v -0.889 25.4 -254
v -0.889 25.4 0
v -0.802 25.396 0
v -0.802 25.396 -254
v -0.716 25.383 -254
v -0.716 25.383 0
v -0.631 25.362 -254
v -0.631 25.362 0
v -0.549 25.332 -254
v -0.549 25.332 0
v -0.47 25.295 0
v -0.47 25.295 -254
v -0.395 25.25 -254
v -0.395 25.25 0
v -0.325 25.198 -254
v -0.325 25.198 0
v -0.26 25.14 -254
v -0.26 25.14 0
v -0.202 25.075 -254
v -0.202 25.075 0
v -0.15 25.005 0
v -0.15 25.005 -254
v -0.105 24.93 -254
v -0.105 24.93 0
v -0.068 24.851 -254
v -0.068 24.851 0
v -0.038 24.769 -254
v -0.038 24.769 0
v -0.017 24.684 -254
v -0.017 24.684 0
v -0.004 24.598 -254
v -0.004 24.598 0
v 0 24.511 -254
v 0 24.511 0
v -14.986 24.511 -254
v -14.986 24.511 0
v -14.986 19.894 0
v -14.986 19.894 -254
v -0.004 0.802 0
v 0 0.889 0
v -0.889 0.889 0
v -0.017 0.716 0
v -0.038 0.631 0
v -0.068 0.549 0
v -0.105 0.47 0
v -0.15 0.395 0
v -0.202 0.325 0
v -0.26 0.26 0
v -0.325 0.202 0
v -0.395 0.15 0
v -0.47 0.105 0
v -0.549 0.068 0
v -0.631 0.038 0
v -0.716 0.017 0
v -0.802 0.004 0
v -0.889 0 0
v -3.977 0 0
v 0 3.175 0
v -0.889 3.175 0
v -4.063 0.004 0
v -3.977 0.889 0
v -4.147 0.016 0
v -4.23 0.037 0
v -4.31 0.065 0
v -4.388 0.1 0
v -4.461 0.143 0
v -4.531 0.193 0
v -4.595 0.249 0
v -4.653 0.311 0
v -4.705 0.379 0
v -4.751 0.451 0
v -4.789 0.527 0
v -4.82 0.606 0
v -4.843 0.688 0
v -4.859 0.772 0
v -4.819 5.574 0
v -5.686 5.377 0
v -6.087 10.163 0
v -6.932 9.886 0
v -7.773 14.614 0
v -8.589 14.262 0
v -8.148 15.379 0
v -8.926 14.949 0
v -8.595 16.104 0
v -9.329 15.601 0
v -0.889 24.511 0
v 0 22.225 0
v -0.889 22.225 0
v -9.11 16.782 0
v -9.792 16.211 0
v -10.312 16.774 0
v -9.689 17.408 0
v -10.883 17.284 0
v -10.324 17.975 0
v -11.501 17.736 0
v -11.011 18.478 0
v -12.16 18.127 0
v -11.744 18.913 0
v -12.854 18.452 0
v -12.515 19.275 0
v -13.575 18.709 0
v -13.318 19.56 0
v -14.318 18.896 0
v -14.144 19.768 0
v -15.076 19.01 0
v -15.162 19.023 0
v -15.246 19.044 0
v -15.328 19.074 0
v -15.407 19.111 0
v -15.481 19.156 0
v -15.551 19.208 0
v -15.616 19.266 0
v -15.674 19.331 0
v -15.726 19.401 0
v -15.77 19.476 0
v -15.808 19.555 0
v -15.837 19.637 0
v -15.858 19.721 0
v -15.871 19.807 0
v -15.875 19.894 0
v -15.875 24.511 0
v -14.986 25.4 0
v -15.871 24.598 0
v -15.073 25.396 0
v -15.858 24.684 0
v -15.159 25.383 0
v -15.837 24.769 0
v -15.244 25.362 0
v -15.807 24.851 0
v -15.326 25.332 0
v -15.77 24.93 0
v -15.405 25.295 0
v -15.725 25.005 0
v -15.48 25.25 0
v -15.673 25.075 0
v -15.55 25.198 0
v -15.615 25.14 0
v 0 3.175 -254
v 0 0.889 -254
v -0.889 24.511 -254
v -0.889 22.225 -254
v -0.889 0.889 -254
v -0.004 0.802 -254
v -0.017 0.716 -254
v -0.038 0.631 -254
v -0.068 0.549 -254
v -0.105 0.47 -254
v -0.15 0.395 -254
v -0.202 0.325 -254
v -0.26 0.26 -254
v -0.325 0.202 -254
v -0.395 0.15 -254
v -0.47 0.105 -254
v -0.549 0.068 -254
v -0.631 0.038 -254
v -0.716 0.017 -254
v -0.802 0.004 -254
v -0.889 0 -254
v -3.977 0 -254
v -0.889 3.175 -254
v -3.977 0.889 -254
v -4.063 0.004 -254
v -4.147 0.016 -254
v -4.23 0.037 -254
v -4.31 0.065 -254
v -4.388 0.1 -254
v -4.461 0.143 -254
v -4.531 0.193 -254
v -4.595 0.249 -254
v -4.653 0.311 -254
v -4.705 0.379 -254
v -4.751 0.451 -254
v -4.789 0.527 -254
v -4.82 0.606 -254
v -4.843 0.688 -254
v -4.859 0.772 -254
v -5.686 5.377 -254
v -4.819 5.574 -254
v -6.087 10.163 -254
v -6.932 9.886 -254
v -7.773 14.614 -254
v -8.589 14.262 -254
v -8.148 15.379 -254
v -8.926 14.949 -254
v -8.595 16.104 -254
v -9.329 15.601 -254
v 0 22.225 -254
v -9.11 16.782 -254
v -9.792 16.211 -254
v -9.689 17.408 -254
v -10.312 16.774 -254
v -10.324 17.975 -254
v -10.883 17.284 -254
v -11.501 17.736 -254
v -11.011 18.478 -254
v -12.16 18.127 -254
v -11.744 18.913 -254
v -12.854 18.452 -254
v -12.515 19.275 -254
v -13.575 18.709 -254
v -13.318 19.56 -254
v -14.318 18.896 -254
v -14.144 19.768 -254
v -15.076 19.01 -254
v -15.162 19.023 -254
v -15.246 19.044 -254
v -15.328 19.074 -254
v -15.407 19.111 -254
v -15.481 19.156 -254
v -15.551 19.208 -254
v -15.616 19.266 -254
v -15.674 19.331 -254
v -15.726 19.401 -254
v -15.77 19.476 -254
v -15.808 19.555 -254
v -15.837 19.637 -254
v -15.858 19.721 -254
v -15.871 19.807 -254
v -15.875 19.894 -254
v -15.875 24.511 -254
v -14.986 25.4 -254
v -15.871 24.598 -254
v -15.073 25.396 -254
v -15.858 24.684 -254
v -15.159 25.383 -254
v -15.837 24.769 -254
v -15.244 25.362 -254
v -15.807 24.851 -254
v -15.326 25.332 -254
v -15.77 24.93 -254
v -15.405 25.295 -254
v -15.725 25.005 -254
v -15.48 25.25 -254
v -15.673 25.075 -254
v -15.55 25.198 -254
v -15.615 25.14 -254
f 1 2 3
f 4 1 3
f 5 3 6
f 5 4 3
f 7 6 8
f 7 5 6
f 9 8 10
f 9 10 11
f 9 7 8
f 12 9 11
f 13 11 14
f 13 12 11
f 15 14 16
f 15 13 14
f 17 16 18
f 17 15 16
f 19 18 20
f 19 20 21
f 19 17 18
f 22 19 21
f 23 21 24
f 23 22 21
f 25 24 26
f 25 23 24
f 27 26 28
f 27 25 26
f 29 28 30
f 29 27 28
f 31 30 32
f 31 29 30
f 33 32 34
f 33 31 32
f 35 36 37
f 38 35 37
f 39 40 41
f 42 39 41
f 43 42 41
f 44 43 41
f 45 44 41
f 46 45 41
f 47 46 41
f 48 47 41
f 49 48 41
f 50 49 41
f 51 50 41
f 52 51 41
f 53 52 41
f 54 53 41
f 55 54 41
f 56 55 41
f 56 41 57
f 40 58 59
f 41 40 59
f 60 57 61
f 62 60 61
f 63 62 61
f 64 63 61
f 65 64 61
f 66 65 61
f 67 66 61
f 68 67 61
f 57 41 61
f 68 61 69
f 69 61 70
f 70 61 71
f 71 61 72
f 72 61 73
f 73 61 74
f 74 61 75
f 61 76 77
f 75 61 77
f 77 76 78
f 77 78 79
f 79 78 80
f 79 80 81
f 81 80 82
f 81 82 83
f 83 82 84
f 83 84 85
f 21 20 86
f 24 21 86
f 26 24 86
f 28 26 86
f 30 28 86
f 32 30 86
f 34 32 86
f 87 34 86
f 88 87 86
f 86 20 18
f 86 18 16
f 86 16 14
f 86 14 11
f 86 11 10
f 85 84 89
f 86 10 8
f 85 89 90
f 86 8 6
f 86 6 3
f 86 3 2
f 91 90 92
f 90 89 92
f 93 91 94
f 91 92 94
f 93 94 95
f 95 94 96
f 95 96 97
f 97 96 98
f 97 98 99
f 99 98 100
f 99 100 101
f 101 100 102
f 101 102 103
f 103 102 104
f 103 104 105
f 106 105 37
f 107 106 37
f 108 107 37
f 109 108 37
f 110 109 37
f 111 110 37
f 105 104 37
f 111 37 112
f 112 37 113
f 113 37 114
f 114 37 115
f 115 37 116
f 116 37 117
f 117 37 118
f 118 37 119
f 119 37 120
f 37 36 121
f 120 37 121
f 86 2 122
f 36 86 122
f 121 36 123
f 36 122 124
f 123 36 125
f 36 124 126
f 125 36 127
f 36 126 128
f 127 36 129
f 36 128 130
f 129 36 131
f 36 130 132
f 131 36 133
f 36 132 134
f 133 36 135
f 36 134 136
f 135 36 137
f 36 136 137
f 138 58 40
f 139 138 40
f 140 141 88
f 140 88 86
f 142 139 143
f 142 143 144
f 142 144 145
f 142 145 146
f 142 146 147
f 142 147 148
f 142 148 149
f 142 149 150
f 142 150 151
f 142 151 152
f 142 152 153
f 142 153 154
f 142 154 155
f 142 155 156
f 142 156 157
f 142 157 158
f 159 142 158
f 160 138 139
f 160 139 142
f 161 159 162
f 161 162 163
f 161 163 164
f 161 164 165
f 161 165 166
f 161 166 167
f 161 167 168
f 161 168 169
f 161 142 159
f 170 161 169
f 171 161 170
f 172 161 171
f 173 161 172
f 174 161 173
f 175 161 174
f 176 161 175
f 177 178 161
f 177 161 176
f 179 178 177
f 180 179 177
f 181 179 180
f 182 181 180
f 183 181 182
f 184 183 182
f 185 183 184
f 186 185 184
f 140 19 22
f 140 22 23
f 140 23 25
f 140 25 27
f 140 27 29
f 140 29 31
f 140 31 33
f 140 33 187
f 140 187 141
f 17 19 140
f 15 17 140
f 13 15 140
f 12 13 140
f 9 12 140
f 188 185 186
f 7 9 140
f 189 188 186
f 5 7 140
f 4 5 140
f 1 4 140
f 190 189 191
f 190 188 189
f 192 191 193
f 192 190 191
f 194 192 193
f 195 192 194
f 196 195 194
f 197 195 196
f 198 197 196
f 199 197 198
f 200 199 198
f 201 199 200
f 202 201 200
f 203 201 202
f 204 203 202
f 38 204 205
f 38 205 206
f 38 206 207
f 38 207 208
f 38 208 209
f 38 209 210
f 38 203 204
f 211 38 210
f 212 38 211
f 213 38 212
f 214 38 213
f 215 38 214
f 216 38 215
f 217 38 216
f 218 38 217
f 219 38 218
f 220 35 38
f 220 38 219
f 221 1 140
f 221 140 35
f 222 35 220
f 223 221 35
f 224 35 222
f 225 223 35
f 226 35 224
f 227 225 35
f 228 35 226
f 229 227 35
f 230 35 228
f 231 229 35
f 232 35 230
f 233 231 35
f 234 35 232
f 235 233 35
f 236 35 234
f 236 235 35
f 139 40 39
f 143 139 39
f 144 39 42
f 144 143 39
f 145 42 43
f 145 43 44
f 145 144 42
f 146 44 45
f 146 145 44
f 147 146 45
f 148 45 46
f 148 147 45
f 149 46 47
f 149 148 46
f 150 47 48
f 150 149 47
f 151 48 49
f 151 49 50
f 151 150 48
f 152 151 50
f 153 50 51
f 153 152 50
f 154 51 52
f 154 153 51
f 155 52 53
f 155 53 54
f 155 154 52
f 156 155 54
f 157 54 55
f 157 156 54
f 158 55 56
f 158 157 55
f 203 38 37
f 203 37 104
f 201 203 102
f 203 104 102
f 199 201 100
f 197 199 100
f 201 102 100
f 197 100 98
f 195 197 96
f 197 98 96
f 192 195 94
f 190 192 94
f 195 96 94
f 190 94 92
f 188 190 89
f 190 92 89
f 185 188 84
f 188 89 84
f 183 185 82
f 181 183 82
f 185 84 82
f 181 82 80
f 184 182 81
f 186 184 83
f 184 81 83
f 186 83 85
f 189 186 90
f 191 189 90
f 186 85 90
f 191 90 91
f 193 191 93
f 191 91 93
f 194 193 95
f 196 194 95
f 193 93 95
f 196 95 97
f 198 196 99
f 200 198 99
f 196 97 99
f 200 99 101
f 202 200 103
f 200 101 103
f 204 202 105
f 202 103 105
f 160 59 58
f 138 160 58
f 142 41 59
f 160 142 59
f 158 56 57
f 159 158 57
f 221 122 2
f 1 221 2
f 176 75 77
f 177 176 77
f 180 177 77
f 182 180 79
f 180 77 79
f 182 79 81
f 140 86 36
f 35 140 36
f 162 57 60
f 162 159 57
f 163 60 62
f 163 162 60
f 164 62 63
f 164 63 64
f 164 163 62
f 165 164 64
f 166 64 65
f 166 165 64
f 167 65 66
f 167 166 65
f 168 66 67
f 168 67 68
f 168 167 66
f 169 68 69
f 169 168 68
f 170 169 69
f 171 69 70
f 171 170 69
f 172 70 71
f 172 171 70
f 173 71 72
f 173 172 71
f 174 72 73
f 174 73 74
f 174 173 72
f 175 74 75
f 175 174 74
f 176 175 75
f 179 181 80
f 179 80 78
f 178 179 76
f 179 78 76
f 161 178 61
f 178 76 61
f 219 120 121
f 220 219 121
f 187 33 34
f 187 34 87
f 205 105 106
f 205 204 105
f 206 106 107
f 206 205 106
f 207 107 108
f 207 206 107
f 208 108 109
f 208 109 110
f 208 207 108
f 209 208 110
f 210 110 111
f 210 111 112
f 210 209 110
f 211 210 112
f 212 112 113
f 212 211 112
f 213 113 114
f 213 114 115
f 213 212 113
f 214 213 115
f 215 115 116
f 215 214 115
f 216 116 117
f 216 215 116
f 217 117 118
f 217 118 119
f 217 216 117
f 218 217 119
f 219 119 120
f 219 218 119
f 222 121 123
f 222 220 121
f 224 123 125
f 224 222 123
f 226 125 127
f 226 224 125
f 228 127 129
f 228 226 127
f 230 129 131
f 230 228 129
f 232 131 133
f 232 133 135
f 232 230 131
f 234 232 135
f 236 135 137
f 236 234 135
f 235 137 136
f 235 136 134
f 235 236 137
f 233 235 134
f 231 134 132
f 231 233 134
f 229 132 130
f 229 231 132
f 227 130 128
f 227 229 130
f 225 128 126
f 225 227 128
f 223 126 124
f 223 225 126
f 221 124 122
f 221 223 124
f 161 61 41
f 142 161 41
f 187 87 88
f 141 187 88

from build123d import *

# Parameters (mm, degrees)
EXTRUDE_THIN1_DEPTH = 254
FILLET1_R           = 0.889


with BuildPart() as part:
    # Sketch1 → Extrude-Thin1 (new body)
    with BuildSketch(Plane.XY):
        with BuildLine():
            Line((0, 3.175), (0, 0))
            Line((0, 0), (-4.7625, 0))
            ThreePointArc((-4.7625, 0), (-6.154789008, 7.270660772), (-8.588987157, 14.261773425))
            ThreePointArc((-8.588987157, 14.261773425), (-11.515725494, 17.745797222), (-15.875, 19.05))
            Line((-15.875, 19.05), (-15.875, 25.4))
            Line((-15.875, 25.4), (0, 25.4))
            Line((0, 25.4), (0, 22.225))
            Line((0, 22.225), (-0.889, 22.225))
            Line((-0.889, 22.225), (-0.889, 24.511))
            Line((-0.889, 24.511), (-14.986, 24.511))
            Line((-14.986, 24.511), (-14.986, 19.894116096))
            ThreePointArc((-14.986, 19.894116096), (-10.661715447, 18.234912963), (-7.772953719, 14.614492048))
            ThreePointArc((-7.772953719, 14.614492048), (-5.400232677, 7.883084139), (-3.977402872, 0.889))
            Line((-3.977402872, 0.889), (-0.889, 0.889))
            Line((-0.889, 0.889), (-0.889, 3.175))
            Line((-0.889, 3.175), (0, 3.175))
        make_face()
    extrude(amount=-EXTRUDE_THIN1_DEPTH)

    # Fillet1
    fillet1_edges = [part.edges().sort_by_distance(p)[0] for p in [
        (0, 0, -127),
        (-4.7625, 0, -127),
        (-15.875, 19.05, -127),
        (-15.875, 25.4, -127),
        (0, 25.4, -127),
    ]]
    fillet(fillet1_edges, radius=FILLET1_R)


solid = part.part
